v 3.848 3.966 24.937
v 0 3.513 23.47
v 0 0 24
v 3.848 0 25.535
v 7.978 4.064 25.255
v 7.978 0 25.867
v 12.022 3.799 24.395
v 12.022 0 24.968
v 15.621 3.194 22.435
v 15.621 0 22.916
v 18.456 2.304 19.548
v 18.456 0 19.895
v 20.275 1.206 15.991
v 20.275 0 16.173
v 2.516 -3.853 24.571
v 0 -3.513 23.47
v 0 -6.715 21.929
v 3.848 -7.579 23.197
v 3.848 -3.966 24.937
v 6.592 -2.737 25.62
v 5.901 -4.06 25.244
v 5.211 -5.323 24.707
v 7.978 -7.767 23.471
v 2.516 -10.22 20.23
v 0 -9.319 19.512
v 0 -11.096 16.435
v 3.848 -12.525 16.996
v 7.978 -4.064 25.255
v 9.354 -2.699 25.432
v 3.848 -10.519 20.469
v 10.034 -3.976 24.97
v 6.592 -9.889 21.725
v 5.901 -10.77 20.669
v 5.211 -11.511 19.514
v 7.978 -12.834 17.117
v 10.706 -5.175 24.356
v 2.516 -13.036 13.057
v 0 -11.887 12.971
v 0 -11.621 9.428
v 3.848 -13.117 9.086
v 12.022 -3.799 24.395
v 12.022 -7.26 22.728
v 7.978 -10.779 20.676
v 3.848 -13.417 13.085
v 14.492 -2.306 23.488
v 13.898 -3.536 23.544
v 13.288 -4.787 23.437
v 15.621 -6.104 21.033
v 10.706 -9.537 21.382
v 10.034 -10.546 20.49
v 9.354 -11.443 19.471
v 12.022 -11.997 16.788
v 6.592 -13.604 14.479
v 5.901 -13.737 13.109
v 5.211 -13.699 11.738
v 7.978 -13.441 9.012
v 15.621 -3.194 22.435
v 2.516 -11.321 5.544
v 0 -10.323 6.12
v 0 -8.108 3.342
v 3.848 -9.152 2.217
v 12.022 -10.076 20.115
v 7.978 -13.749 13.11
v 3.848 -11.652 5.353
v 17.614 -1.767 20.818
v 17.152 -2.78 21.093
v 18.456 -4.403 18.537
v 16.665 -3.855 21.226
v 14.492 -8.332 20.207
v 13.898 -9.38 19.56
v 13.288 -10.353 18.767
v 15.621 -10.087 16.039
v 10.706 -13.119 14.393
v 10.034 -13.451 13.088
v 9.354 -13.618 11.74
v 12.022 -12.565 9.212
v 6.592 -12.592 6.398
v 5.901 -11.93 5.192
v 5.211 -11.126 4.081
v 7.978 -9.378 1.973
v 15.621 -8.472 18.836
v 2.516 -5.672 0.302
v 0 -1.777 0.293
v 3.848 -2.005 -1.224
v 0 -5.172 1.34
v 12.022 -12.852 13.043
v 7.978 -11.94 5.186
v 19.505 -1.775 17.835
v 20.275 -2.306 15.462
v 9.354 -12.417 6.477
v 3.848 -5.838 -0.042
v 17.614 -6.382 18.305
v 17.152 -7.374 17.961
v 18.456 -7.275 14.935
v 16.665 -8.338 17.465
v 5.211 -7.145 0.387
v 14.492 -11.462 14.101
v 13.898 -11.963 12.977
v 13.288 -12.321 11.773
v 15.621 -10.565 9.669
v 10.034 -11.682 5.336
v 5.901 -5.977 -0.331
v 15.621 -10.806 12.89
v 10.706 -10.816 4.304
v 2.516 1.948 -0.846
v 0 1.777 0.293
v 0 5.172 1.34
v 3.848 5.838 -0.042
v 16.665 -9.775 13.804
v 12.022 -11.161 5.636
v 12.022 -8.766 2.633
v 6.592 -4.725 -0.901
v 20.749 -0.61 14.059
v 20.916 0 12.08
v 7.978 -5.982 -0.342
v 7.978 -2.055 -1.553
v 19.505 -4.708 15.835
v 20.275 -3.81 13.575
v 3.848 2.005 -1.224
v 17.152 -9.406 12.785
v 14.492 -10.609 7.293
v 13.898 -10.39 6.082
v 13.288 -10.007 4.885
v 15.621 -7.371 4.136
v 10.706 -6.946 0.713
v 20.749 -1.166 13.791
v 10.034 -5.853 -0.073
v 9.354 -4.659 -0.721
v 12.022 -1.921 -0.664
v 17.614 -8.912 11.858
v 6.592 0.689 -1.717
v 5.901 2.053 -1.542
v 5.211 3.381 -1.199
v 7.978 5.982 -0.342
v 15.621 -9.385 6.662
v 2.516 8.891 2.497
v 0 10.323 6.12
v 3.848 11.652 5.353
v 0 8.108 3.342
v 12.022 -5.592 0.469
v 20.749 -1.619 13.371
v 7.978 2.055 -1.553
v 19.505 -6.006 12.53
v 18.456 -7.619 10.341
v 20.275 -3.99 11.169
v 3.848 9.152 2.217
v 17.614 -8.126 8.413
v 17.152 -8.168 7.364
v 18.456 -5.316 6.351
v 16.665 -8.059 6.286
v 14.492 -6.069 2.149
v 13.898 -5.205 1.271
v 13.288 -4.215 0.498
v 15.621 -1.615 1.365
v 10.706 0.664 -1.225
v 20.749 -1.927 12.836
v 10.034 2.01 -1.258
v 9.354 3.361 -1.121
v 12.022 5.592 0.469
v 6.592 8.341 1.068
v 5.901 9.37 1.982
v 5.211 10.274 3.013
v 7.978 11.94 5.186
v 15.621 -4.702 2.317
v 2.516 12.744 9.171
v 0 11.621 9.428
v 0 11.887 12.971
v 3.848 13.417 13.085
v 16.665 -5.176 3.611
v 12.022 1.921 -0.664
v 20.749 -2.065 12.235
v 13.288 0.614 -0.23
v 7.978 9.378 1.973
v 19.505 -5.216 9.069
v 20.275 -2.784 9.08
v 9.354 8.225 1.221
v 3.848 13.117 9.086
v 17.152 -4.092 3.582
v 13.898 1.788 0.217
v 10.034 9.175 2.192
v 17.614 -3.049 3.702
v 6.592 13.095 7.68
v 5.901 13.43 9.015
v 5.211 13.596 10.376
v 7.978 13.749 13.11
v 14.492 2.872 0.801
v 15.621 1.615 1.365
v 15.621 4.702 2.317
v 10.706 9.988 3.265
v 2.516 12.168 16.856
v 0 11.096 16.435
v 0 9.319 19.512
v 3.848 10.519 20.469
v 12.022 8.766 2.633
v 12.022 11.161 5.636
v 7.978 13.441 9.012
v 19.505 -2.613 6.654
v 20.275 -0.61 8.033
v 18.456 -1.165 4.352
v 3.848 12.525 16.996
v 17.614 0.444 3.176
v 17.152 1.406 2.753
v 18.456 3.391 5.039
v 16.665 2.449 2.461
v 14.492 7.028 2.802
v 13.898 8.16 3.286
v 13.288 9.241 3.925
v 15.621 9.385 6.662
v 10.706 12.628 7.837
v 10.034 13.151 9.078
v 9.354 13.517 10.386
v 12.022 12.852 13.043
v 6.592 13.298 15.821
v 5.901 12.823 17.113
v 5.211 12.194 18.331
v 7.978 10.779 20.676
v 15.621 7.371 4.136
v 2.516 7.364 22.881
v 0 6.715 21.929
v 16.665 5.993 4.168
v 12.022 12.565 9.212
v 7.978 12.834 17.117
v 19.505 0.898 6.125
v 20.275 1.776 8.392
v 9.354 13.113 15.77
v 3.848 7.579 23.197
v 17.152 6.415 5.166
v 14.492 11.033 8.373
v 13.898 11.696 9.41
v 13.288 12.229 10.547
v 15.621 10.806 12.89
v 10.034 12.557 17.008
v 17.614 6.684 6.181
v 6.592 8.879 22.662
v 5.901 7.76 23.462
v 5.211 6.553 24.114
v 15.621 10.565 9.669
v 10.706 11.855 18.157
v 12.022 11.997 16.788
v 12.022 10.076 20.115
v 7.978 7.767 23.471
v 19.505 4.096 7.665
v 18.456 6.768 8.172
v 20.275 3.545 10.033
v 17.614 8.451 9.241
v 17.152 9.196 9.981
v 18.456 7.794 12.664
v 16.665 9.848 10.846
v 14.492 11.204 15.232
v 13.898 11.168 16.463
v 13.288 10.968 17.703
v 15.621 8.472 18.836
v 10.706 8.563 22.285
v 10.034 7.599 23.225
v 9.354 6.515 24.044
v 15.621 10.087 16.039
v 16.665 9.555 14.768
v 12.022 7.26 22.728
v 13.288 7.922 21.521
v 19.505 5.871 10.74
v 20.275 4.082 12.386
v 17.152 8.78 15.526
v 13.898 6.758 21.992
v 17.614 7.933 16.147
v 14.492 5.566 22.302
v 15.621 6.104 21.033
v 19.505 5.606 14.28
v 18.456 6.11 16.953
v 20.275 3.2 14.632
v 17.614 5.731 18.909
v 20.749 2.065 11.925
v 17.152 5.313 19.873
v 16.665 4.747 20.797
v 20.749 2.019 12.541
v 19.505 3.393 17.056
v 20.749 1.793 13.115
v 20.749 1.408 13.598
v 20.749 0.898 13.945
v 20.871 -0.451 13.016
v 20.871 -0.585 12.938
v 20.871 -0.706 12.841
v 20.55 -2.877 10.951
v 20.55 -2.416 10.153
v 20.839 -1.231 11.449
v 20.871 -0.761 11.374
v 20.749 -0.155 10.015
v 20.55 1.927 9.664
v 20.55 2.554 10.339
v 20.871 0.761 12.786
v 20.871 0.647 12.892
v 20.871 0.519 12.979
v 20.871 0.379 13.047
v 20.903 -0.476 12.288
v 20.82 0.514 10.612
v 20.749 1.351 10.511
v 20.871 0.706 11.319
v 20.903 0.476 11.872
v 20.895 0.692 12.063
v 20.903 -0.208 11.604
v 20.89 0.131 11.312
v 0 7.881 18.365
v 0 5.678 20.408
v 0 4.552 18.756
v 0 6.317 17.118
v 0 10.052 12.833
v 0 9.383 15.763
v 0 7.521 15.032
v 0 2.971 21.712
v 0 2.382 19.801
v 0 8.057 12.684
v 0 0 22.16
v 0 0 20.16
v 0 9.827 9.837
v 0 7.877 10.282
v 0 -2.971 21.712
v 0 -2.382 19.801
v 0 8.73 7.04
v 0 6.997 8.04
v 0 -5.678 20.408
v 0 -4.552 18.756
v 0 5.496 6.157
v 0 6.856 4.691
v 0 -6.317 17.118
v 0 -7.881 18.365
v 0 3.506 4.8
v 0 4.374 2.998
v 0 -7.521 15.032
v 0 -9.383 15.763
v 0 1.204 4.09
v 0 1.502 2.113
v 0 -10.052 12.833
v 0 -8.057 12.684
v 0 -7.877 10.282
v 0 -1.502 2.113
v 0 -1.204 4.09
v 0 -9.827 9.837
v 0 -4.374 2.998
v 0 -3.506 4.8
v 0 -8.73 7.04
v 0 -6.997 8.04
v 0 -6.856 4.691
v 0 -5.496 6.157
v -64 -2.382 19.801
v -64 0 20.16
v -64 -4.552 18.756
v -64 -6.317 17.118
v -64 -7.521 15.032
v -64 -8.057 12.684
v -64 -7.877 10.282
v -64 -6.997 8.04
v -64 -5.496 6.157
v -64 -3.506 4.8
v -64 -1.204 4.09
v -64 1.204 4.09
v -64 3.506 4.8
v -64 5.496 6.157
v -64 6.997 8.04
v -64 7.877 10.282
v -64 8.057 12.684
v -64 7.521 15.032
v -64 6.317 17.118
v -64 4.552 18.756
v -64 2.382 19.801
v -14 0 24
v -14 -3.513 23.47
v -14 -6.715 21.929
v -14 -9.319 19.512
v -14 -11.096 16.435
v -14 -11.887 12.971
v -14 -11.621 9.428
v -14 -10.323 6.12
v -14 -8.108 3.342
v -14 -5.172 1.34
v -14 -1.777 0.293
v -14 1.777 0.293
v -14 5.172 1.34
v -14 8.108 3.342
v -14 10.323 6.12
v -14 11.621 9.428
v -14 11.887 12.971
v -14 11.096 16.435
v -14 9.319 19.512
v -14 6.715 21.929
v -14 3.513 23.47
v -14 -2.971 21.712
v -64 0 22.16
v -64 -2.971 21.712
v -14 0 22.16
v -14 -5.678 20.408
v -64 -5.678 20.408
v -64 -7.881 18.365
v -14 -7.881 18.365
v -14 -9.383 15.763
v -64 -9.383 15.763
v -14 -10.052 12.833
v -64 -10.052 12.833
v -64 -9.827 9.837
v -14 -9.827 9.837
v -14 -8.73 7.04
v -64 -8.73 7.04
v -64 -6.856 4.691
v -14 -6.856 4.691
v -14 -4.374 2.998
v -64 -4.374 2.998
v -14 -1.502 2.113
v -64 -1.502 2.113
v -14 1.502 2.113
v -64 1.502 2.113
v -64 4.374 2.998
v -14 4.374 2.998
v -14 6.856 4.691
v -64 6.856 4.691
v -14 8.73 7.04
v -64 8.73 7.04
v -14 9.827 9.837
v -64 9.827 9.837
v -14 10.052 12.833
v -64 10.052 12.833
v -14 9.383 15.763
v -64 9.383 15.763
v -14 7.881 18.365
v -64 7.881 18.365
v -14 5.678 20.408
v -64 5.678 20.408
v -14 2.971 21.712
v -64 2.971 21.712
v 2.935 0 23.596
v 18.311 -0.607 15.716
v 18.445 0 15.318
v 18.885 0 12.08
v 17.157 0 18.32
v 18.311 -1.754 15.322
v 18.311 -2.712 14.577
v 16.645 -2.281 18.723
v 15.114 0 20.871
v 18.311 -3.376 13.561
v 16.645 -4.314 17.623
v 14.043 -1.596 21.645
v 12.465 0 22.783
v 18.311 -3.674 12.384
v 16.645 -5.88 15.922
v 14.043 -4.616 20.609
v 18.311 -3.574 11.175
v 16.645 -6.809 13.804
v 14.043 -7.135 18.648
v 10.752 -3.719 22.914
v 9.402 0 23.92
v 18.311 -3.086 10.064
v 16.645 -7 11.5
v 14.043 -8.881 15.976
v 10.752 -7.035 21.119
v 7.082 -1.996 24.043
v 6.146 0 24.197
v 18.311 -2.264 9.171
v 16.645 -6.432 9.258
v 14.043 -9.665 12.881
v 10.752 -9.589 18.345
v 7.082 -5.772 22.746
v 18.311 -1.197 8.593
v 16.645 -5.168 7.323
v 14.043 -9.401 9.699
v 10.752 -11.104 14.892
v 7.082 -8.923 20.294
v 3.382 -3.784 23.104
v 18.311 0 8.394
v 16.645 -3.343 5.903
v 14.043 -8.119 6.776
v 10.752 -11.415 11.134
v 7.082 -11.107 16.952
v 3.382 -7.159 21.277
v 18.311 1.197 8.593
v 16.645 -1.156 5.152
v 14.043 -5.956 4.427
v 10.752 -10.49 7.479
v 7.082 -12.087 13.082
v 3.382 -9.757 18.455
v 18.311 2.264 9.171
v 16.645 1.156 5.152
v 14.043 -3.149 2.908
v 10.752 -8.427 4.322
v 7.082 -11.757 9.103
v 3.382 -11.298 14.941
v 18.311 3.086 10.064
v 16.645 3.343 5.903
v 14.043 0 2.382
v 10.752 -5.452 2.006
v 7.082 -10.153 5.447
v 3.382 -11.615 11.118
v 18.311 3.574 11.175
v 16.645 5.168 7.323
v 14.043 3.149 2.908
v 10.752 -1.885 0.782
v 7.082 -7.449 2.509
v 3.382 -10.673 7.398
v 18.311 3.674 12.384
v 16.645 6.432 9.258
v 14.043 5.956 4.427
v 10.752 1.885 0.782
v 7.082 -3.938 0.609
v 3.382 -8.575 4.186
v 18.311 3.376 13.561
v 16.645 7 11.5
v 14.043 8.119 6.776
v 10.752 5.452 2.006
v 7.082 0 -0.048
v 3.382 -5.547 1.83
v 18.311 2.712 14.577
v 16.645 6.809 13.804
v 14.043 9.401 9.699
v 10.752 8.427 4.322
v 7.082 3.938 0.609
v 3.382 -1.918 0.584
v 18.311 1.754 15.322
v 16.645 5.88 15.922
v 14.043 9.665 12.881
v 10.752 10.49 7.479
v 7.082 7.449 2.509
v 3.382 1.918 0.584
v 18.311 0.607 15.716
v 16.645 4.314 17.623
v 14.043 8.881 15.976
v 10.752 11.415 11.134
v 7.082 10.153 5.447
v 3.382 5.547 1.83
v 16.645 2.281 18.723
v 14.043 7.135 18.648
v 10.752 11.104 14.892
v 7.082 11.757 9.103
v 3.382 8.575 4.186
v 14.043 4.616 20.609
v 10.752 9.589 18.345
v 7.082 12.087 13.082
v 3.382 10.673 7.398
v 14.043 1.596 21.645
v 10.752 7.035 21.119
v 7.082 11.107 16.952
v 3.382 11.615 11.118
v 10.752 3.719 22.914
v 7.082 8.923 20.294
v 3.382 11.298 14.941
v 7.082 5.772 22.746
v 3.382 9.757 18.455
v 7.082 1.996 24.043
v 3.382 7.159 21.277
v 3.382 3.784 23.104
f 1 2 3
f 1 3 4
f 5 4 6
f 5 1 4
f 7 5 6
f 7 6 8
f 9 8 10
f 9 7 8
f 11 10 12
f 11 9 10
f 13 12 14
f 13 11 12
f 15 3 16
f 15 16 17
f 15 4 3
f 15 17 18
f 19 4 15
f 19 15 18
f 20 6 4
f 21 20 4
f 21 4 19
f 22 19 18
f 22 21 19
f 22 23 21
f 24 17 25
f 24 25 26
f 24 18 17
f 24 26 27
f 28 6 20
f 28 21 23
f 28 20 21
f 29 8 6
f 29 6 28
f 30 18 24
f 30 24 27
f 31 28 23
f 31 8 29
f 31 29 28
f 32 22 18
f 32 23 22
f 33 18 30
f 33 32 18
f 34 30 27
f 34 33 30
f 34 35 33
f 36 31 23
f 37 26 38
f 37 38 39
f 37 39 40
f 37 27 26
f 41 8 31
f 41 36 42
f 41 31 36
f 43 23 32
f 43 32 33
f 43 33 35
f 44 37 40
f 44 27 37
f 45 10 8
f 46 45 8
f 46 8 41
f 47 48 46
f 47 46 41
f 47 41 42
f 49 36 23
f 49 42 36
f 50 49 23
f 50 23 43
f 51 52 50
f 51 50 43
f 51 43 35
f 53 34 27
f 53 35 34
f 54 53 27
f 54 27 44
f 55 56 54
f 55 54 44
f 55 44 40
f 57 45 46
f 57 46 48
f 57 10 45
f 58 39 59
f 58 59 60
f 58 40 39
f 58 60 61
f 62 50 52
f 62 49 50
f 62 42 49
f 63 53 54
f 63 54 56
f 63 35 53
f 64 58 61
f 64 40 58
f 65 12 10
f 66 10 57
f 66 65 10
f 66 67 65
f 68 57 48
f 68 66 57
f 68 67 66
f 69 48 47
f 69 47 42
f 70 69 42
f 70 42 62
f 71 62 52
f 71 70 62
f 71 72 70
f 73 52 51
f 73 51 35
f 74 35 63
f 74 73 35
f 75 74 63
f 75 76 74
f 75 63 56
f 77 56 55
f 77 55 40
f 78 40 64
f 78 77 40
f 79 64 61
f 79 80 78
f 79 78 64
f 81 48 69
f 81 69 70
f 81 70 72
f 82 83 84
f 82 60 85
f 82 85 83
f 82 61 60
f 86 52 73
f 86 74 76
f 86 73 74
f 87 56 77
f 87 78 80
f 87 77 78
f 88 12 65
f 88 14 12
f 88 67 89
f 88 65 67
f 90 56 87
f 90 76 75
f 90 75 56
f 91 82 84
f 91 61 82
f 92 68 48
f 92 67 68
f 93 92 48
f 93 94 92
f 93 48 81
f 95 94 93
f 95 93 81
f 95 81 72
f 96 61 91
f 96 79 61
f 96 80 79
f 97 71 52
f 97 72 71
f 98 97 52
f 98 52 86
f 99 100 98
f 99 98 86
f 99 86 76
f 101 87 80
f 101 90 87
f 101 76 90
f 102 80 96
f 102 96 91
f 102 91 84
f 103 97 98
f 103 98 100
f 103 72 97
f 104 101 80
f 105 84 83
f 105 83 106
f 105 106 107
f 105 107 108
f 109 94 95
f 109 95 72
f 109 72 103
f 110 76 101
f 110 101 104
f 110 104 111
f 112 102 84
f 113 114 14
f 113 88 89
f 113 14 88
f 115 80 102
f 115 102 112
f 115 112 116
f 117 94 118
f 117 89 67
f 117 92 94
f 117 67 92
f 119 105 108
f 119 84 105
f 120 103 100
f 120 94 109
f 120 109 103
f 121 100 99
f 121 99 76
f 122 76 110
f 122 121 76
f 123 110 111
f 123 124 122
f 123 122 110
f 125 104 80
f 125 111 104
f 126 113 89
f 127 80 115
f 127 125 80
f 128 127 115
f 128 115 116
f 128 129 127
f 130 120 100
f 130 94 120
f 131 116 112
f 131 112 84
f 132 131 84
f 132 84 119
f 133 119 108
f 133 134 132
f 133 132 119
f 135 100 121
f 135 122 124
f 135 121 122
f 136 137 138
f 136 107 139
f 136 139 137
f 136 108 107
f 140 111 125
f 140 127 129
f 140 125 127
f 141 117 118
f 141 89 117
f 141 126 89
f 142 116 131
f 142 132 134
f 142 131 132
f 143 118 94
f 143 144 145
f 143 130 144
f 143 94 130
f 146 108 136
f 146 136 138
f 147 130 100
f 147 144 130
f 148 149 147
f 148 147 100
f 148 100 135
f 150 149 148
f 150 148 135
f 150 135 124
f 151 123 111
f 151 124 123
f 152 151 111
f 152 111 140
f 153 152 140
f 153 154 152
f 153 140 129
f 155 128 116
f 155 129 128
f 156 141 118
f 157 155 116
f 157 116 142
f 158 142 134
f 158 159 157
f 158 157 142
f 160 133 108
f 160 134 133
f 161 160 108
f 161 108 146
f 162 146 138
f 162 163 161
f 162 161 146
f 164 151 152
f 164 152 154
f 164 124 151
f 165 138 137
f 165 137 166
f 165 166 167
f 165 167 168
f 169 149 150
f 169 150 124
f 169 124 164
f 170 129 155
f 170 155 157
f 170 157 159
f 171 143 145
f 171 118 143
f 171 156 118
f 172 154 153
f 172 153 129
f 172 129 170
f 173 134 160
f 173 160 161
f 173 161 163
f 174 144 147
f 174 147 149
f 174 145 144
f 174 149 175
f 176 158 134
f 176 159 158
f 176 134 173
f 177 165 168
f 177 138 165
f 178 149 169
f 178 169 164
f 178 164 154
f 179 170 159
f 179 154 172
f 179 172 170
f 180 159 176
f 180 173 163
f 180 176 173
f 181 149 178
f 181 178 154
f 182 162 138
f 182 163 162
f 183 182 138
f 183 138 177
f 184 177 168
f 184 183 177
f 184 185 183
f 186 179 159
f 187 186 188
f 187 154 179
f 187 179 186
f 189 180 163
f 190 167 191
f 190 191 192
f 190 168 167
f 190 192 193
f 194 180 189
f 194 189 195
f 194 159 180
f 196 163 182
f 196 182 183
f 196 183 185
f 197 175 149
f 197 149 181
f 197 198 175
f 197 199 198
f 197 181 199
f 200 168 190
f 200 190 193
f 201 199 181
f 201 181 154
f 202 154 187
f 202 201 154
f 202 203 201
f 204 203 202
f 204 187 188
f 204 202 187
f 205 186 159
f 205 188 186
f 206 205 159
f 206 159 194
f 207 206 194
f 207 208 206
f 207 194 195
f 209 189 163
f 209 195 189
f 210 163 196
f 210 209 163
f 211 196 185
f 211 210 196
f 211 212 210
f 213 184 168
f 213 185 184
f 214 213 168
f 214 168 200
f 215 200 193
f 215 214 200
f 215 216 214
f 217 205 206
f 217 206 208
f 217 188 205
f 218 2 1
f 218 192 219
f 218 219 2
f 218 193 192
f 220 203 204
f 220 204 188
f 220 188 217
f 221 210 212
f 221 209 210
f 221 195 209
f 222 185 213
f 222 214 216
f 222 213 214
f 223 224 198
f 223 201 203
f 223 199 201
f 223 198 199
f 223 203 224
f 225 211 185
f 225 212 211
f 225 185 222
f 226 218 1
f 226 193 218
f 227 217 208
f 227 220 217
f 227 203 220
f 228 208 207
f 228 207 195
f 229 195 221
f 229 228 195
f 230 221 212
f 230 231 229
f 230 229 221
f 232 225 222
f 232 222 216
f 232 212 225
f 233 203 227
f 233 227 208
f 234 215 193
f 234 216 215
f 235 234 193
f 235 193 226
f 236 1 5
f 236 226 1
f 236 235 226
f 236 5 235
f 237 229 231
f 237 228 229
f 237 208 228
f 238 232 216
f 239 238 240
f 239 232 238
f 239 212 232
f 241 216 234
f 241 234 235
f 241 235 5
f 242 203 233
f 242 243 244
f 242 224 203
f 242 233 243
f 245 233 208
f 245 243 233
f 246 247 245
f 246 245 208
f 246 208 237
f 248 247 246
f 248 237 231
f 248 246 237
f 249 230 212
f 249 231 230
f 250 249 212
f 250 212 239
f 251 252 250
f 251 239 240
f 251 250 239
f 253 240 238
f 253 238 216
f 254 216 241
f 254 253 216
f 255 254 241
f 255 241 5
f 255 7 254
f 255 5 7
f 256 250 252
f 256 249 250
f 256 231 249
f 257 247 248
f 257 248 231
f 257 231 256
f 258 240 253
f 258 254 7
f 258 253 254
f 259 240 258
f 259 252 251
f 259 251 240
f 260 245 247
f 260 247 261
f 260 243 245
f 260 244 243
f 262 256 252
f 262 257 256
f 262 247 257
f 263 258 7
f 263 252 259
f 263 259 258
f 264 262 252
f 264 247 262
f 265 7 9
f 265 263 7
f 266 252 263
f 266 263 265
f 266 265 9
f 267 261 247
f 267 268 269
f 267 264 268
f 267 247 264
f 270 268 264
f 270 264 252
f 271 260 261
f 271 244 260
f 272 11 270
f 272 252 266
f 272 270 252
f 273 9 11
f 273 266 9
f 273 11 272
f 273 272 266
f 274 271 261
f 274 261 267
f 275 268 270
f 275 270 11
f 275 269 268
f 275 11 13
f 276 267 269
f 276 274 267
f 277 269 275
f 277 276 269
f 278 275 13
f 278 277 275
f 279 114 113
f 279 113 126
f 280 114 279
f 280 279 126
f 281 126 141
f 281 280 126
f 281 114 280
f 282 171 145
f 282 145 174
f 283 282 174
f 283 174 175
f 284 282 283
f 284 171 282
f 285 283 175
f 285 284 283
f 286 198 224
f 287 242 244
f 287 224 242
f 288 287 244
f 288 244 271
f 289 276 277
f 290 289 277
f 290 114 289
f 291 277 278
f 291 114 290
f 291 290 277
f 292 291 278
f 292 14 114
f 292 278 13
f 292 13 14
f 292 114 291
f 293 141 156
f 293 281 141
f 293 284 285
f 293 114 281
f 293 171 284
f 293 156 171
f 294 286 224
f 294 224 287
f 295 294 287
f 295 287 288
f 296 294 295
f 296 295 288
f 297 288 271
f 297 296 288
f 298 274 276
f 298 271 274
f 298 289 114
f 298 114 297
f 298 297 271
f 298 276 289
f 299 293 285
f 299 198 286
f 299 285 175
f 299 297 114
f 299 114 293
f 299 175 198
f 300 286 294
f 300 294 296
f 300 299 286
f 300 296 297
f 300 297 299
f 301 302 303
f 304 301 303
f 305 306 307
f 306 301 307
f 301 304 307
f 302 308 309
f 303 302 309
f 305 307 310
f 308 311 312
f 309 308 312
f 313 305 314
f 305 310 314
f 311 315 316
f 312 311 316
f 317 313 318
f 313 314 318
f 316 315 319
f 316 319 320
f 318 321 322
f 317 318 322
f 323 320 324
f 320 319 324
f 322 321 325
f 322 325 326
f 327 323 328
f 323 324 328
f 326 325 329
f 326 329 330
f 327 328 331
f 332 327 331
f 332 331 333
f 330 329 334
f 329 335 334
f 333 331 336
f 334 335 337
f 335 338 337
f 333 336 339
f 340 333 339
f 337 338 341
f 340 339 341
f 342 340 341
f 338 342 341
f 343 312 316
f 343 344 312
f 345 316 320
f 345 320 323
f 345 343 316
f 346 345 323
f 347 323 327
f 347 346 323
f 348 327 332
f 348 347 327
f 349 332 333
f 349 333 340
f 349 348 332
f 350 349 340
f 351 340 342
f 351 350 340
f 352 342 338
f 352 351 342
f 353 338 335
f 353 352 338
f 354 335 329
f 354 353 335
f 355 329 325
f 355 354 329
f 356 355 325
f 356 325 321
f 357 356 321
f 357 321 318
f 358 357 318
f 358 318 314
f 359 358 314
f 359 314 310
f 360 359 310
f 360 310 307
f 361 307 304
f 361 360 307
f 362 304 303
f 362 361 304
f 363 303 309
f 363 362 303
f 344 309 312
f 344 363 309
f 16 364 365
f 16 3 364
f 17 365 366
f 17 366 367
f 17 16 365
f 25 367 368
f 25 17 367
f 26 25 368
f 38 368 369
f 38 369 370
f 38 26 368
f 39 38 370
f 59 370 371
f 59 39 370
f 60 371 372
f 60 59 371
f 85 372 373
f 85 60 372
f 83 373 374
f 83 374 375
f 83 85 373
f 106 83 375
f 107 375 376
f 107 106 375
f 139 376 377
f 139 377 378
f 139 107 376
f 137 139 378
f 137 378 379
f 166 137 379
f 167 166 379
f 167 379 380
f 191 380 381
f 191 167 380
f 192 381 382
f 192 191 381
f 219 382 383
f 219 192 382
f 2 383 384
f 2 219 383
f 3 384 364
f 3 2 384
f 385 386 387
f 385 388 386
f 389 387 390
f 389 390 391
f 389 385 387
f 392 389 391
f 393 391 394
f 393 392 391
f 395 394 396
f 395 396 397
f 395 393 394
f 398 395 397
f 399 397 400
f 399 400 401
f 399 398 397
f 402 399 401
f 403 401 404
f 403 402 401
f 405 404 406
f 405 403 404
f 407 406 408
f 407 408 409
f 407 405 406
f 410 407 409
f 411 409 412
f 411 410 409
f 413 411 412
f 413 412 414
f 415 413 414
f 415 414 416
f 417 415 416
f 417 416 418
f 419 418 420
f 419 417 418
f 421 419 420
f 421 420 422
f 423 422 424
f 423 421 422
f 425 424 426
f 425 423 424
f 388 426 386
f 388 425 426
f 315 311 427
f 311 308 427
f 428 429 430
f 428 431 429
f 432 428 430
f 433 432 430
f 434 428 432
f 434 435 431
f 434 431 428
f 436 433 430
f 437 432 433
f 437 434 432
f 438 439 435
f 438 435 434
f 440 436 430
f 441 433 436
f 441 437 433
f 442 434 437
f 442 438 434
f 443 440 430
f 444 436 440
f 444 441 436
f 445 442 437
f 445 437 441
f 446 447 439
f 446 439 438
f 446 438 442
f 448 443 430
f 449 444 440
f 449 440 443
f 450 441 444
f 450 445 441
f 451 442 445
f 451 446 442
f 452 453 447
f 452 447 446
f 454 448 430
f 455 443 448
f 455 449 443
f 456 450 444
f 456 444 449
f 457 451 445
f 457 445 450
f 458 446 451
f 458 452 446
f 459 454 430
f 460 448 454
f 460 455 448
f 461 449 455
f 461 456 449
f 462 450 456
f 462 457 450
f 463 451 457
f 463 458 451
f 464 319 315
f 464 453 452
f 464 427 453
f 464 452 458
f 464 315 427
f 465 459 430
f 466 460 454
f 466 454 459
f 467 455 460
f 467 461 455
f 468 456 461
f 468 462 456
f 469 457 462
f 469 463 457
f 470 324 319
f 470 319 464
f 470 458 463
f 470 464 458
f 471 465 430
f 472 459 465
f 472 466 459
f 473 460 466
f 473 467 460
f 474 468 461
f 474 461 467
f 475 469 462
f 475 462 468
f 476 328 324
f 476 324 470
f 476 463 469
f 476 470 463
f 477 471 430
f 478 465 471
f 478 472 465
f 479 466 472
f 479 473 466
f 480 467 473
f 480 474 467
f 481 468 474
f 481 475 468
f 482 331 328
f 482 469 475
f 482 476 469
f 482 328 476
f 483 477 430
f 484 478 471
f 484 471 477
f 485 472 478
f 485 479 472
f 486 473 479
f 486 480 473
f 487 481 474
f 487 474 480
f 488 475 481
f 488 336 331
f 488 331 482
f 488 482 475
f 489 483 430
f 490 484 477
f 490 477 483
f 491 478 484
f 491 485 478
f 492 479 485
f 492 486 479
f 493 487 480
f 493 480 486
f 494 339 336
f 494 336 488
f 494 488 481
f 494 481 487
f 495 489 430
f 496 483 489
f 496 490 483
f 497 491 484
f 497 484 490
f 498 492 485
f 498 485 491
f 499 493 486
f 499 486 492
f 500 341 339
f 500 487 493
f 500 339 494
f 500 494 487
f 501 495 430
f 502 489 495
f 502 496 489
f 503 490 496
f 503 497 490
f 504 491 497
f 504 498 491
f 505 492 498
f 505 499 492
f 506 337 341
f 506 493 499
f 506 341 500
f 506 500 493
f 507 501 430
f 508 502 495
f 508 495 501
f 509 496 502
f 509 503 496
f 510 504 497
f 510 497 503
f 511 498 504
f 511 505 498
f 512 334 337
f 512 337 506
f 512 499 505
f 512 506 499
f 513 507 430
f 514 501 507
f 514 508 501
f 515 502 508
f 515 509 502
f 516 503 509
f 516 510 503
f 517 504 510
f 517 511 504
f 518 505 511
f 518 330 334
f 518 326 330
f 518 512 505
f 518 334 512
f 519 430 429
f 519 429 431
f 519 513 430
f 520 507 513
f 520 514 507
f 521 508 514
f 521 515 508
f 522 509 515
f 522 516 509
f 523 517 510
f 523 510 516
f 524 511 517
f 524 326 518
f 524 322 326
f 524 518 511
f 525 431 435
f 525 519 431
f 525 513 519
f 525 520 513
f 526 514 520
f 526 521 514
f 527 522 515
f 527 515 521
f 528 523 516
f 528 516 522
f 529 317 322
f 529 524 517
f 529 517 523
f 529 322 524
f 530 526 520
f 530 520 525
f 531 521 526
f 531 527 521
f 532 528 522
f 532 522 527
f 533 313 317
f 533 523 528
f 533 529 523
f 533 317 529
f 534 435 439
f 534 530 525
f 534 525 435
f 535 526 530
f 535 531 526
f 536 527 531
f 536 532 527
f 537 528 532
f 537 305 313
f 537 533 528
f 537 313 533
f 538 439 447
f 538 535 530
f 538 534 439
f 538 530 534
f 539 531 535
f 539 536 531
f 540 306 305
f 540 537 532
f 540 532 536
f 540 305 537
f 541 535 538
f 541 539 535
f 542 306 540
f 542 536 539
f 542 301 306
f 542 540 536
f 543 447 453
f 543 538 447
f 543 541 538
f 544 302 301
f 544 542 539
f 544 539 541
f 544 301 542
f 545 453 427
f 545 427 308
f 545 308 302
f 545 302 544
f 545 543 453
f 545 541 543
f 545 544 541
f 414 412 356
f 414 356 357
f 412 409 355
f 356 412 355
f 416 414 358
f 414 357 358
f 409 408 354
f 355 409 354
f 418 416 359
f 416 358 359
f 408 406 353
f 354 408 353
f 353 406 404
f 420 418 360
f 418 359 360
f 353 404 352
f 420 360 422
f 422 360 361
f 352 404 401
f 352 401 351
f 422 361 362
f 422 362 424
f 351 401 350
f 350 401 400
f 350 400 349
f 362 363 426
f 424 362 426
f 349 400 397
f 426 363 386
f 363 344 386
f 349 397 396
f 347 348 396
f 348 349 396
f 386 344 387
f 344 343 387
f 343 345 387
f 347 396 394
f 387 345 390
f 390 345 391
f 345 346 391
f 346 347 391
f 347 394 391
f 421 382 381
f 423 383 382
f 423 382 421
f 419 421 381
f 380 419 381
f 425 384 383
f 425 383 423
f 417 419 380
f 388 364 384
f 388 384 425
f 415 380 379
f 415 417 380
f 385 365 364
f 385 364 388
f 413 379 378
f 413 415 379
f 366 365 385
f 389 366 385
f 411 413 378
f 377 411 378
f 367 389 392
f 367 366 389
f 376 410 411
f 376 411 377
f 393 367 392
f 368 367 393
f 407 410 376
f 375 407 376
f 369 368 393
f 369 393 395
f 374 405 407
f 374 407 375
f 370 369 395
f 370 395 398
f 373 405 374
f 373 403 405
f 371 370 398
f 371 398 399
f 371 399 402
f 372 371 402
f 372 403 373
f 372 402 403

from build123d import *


with BuildPart() as part:
    # Sketch1 → Revolve3 (revolve)
    with BuildSketch(Plane(origin=(0, 0, 0), x_dir=(1, 0, 0), z_dir=(0, 1, 0))):
        Polygon((-64, -22.159983722), (-64, -20.159983722), (-14, -20.159983722), (0, -20.159983722), (0, -22.159983722), (-14, -22.159983722), align=None)
        with BuildLine():
            Line((20.916121764, -12.079991861), (18.884815844, -12.079991861))
            ThreePointArc((18.884815844, -12.079991861), (12.465262752, -22.783291649), (0, -22.159983722))
            Line((0, -22.159983722), (-14, -22.159983722))
            Line((-14, -22.159983722), (-14, -24))
            Line((-14, -24), (0, -24))
            ThreePointArc((0, -24), (13.89849199, -24.076944491), (20.916121764, -12.079991861))
        make_face()
    revolve(axis=Axis((-74.418855498, 0, 12.079991861), (1, 0, 0)))


solid = part.part
